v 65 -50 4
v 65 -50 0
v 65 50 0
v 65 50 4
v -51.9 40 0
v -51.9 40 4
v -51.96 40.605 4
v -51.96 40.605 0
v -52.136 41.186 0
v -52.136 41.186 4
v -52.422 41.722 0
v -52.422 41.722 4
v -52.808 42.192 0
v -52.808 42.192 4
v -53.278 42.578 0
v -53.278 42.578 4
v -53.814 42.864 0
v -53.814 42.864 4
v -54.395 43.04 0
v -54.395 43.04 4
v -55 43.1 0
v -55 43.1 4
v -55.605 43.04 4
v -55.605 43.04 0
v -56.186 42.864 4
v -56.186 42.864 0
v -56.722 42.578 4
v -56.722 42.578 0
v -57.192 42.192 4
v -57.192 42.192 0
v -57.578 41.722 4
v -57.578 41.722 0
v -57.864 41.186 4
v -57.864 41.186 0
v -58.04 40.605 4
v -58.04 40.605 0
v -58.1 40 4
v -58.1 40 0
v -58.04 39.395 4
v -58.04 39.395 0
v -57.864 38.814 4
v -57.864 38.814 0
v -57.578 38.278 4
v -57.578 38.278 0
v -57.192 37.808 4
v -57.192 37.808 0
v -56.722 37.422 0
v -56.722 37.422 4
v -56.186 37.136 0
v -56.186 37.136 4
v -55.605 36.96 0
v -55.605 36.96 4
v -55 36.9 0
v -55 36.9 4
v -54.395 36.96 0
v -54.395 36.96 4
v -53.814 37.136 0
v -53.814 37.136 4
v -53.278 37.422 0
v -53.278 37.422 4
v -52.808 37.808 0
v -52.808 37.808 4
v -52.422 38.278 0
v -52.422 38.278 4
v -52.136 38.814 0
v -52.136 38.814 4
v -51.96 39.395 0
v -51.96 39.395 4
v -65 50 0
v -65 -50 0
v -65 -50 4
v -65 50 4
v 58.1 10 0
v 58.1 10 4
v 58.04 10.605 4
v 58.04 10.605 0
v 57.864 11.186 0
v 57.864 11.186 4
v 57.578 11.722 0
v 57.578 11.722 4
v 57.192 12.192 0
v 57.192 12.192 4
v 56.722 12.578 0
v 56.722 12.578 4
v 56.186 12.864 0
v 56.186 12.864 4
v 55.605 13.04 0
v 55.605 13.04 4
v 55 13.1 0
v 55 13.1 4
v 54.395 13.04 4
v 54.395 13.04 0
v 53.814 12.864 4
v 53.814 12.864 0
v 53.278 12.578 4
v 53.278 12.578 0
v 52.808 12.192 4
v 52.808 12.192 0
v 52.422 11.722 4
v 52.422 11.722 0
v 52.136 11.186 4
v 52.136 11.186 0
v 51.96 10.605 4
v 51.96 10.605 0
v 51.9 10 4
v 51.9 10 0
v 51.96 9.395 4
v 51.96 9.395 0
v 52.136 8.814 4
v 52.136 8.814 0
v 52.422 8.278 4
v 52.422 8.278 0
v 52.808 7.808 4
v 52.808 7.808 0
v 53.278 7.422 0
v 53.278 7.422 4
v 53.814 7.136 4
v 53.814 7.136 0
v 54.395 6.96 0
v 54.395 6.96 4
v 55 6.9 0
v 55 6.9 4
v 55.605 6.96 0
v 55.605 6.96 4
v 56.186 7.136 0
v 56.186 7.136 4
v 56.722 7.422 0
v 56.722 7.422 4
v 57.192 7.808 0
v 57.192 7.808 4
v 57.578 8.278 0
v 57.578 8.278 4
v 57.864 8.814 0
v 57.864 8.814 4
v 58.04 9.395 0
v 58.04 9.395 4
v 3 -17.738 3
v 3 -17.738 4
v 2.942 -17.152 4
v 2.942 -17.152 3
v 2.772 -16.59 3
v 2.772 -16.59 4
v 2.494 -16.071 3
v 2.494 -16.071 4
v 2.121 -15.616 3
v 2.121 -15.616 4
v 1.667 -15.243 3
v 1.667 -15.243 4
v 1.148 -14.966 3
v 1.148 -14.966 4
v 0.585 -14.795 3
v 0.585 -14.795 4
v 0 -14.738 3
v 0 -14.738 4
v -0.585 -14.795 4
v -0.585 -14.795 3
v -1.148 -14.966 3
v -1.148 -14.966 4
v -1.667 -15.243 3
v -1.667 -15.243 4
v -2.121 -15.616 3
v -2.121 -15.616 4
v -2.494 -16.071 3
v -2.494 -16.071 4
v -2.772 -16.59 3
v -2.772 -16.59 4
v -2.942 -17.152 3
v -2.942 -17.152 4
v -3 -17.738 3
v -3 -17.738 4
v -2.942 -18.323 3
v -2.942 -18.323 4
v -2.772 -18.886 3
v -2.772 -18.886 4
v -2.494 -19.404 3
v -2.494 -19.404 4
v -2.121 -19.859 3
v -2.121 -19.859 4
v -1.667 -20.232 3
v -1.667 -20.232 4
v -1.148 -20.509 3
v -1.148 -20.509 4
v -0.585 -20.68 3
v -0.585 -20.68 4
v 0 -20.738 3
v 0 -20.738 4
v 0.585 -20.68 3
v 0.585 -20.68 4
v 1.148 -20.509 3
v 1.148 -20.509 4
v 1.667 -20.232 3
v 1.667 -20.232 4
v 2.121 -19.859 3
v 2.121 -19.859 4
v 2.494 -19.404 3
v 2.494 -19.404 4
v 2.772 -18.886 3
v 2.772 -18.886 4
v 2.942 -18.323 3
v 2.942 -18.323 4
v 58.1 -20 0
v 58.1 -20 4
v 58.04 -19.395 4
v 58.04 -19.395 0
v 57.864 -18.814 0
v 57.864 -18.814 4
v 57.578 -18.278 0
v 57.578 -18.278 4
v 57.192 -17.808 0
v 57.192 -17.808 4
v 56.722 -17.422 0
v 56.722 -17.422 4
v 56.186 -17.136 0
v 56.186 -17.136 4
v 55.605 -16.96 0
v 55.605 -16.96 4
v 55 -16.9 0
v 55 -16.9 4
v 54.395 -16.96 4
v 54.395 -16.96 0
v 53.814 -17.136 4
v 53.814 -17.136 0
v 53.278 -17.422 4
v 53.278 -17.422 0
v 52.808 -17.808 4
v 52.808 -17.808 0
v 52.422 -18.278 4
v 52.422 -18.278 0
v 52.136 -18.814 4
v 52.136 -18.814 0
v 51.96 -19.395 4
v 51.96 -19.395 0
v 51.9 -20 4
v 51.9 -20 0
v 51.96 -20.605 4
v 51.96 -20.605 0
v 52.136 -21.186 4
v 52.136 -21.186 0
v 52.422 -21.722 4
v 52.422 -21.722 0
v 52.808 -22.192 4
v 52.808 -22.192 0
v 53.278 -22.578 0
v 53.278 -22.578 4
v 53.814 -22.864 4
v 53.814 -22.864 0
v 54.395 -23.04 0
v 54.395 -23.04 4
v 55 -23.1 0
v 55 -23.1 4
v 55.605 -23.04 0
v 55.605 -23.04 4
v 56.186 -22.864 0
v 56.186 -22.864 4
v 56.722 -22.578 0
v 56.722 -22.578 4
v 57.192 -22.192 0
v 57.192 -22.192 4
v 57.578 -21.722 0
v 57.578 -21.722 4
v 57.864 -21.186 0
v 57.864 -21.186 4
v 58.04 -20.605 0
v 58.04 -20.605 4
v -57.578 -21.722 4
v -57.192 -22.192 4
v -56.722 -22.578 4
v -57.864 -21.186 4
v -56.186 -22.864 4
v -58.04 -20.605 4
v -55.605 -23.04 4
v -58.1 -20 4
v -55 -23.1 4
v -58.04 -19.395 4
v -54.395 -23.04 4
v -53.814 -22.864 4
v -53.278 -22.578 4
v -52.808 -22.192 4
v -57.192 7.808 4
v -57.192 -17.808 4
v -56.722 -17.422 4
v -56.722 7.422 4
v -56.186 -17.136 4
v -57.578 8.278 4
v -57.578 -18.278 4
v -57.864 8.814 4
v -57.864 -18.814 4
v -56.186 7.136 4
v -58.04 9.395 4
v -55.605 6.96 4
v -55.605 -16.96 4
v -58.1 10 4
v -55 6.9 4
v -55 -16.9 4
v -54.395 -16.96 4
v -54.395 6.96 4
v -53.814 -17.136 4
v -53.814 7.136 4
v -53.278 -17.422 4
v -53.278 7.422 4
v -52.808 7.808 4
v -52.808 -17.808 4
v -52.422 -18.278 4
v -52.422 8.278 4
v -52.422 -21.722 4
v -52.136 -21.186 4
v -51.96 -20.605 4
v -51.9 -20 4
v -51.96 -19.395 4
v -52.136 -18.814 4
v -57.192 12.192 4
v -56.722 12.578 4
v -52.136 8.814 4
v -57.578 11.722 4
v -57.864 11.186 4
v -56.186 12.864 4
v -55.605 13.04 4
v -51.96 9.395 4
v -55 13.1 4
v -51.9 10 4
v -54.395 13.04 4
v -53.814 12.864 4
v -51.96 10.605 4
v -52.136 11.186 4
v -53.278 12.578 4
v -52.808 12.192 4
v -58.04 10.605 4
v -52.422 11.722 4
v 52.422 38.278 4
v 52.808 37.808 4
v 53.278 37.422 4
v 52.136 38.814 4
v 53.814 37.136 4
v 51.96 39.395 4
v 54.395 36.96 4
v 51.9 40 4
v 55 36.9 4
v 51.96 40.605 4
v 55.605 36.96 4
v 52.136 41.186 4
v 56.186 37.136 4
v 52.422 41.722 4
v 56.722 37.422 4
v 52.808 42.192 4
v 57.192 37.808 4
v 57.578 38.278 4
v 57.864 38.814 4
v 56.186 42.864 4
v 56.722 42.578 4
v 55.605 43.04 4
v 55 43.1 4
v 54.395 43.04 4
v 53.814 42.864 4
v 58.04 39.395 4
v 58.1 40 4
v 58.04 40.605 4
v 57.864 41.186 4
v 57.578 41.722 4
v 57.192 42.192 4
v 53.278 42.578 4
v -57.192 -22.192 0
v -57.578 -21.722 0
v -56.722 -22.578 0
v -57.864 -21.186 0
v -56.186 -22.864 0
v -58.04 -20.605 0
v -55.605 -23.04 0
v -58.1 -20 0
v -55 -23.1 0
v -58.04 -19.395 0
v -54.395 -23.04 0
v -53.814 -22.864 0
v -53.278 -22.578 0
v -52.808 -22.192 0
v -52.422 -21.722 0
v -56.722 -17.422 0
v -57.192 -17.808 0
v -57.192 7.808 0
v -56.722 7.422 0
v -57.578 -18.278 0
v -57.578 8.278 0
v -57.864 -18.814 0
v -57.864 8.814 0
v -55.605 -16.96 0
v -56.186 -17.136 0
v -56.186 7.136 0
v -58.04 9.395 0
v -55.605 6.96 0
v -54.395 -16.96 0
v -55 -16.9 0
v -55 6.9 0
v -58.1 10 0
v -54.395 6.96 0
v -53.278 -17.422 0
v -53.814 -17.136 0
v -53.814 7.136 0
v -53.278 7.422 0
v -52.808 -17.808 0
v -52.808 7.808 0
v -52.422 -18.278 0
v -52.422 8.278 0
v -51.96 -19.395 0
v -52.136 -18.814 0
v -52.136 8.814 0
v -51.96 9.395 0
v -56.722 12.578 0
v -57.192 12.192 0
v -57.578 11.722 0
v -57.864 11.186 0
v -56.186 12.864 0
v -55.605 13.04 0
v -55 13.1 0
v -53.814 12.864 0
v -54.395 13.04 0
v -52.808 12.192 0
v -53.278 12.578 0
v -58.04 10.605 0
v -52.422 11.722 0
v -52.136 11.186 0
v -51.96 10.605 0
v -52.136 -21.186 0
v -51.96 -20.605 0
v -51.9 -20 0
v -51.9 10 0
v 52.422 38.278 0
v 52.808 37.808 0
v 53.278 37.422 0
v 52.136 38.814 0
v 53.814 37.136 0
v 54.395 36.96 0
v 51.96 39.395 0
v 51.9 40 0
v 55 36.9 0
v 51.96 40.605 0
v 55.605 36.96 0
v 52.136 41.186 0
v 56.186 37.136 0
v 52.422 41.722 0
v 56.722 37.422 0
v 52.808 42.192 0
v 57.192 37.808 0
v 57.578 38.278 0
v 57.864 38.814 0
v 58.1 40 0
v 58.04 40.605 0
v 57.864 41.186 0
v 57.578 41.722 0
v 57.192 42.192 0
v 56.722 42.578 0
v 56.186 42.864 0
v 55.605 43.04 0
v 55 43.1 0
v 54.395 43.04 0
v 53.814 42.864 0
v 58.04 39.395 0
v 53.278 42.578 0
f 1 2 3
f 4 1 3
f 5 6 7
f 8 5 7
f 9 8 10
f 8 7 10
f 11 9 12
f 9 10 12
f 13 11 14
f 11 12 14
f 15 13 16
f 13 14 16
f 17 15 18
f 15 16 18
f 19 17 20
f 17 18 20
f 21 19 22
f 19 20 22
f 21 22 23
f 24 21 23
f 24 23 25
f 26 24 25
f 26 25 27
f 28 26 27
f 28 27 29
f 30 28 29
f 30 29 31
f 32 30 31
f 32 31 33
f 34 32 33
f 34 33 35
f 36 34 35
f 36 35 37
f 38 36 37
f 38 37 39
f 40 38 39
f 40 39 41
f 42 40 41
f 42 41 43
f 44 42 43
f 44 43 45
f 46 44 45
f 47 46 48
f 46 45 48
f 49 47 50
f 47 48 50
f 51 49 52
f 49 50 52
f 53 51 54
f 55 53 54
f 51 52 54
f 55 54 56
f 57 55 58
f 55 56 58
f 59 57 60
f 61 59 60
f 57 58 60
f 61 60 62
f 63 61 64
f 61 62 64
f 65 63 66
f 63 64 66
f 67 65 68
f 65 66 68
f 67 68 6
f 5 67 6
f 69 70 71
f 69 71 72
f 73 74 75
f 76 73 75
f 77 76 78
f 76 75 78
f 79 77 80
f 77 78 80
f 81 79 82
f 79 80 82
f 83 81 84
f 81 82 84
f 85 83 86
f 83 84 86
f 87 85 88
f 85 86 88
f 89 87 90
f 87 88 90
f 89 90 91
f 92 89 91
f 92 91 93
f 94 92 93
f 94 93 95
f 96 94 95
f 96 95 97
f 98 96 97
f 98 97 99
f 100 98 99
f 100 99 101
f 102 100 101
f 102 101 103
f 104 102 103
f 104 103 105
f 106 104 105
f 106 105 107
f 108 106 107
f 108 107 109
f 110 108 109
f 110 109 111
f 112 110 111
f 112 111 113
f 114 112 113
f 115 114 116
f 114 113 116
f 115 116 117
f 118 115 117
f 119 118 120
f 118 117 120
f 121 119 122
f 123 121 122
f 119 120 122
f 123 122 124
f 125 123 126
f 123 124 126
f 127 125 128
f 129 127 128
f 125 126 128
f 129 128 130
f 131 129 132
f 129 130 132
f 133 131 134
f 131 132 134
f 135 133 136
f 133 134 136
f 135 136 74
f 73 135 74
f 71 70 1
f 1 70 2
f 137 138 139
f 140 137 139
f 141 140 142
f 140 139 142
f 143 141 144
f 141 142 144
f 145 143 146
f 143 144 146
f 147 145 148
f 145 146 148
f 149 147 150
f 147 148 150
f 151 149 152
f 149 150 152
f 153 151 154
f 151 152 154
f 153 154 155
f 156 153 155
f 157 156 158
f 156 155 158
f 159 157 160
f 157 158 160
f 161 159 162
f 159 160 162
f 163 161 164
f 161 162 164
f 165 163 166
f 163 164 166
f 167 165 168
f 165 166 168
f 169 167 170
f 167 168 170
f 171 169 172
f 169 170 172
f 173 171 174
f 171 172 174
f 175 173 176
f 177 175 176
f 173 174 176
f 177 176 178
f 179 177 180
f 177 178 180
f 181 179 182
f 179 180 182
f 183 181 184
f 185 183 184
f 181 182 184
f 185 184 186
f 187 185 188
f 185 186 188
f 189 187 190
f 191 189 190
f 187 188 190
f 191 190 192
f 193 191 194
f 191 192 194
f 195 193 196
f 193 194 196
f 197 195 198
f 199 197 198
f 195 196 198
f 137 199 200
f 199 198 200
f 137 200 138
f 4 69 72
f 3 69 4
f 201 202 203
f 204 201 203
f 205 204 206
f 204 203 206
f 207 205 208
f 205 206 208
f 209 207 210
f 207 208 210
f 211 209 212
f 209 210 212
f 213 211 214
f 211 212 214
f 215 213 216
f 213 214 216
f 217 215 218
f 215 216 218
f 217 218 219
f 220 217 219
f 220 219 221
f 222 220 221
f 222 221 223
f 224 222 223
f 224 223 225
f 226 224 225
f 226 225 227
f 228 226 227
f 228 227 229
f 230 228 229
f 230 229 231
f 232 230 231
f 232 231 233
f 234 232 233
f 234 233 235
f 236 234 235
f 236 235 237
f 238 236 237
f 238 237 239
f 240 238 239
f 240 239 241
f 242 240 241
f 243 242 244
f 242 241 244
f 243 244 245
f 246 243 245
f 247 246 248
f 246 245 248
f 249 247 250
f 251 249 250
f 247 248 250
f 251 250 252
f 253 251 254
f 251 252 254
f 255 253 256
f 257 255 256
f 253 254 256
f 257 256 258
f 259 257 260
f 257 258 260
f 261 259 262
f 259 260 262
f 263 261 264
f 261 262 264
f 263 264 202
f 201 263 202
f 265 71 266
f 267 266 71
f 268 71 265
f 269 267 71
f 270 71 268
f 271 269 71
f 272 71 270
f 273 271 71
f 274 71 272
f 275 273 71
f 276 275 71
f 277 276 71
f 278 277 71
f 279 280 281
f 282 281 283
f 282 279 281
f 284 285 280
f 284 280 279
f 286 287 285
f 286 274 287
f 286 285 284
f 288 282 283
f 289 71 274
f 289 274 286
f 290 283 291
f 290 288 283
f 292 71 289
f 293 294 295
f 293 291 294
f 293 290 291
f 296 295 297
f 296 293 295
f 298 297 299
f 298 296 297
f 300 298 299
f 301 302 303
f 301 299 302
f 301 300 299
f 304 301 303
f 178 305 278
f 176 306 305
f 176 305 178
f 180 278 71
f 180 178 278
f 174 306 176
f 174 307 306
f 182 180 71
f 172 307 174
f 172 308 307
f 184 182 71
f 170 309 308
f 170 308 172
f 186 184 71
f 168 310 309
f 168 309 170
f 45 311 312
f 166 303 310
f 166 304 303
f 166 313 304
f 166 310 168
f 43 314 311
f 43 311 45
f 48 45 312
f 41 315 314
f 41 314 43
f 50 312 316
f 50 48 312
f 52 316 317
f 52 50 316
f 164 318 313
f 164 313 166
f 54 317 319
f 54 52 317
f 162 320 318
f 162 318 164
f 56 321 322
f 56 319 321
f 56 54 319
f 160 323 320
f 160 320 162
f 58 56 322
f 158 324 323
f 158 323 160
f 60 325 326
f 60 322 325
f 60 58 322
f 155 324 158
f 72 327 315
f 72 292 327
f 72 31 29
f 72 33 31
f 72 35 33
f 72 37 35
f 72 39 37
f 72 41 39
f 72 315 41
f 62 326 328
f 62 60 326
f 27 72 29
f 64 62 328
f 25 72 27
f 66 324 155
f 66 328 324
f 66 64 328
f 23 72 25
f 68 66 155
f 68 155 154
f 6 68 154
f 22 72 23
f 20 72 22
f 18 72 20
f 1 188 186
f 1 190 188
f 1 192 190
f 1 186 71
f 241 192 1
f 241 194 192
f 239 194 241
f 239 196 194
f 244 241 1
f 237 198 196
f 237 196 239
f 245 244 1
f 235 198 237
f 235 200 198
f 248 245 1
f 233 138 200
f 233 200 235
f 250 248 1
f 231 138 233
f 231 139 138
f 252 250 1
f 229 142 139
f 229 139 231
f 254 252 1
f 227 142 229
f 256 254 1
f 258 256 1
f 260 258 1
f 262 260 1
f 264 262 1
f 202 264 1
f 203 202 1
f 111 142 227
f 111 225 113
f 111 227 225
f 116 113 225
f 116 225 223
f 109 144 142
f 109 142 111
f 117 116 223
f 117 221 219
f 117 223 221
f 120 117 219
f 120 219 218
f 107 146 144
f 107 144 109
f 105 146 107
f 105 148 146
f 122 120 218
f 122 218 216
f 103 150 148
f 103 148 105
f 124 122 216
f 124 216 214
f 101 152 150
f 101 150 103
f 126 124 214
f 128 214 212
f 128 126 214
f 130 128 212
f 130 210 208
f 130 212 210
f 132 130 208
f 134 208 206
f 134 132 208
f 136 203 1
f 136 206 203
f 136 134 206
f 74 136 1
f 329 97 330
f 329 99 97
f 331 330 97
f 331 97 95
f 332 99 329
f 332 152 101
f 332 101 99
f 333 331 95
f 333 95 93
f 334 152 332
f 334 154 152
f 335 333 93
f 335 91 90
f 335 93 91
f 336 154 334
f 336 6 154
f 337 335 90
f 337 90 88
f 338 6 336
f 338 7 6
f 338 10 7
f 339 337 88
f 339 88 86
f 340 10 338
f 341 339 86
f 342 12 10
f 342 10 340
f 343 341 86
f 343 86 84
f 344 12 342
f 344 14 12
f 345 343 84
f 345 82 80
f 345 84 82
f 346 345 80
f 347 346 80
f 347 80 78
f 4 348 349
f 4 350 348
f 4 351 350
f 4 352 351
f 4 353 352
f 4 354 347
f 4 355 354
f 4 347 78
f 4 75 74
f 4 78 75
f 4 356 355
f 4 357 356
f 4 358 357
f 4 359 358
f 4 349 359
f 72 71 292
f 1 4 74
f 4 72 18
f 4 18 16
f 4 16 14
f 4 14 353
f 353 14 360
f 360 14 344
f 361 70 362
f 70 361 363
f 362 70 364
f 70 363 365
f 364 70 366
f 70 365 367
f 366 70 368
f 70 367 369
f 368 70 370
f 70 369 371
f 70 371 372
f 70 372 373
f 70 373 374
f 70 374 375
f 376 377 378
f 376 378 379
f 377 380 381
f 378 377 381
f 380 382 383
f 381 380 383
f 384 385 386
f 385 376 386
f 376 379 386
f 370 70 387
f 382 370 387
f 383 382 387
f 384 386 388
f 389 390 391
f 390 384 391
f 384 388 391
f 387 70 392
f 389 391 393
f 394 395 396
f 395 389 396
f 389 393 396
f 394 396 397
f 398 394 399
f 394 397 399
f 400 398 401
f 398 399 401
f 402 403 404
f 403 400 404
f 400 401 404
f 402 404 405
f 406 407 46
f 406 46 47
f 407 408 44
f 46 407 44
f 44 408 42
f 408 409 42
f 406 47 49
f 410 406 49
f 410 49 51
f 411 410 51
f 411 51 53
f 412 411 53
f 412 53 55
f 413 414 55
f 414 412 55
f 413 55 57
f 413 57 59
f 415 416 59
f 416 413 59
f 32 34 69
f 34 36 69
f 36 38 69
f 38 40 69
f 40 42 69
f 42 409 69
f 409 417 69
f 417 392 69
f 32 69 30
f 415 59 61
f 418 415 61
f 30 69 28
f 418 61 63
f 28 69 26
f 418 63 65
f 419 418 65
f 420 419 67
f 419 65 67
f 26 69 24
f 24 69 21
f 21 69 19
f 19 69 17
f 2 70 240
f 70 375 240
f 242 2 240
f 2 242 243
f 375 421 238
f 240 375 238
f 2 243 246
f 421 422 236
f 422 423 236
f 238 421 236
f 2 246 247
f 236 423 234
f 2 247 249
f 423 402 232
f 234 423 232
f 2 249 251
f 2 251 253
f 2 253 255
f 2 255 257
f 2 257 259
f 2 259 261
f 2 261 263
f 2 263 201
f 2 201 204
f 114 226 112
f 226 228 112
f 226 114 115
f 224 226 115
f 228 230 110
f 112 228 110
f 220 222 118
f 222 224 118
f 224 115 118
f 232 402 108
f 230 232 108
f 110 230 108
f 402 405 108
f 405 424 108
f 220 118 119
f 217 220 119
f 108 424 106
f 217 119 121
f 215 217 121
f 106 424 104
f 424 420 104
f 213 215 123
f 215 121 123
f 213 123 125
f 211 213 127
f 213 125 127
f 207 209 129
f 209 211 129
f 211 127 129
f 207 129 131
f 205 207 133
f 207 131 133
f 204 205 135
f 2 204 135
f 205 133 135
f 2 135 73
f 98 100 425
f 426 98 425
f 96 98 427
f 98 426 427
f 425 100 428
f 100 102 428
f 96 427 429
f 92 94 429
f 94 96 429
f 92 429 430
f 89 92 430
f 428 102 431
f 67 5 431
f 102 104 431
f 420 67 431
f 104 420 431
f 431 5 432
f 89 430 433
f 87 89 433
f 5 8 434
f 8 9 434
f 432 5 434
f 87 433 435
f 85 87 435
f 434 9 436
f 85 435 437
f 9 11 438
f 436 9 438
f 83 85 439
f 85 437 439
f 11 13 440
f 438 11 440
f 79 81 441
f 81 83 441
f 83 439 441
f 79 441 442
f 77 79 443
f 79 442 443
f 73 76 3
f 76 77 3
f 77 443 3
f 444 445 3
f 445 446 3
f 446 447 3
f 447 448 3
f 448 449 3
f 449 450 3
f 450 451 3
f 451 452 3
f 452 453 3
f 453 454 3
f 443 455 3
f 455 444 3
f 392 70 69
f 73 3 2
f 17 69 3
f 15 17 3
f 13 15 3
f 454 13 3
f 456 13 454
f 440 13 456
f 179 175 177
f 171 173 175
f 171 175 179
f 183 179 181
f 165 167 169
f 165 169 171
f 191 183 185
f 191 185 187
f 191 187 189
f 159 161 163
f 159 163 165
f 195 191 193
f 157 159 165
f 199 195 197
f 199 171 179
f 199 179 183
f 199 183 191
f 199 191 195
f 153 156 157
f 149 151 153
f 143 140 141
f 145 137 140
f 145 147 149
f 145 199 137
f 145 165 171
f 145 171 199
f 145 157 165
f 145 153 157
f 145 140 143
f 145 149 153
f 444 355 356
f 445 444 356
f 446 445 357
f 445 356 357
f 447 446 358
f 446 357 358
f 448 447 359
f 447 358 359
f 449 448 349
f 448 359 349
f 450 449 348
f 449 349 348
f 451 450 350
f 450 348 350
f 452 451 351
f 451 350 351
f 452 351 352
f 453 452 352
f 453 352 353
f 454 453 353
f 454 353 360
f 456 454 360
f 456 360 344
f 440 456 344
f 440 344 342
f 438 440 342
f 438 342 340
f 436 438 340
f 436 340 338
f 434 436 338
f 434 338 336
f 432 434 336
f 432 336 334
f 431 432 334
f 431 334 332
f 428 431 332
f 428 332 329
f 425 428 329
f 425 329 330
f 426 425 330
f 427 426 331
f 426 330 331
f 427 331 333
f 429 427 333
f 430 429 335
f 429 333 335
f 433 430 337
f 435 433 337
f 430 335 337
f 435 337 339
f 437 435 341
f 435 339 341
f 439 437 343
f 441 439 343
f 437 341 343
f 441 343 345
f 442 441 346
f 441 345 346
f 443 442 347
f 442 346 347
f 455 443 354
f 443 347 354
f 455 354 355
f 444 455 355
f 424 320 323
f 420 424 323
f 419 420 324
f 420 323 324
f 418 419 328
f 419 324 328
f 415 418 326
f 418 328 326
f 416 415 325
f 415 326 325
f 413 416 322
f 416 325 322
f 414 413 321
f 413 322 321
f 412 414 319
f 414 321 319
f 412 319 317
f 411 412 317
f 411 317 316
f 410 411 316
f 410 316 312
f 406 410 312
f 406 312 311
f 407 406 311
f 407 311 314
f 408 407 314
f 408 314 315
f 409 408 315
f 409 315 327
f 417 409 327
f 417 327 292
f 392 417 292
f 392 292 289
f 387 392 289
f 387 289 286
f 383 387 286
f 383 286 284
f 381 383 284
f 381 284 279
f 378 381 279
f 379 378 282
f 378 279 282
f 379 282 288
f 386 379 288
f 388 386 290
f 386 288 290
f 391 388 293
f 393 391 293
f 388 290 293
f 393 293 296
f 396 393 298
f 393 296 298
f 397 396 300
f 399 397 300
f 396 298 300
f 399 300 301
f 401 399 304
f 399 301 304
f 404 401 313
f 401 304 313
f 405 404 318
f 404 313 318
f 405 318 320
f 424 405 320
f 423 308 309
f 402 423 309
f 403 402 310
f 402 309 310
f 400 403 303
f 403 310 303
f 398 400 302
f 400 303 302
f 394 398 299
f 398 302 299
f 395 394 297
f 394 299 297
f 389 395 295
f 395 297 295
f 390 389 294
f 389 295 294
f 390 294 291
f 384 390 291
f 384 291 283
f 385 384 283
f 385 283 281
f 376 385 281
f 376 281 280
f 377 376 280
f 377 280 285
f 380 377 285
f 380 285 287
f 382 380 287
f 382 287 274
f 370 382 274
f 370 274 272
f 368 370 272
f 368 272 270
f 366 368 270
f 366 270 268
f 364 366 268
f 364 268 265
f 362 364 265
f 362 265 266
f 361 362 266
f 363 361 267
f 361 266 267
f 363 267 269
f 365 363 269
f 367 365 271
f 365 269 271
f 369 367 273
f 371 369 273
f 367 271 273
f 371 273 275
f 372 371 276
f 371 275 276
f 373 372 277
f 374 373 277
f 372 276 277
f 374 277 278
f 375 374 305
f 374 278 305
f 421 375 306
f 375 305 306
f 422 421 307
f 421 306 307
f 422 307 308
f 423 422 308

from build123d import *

# Parameters (mm, degrees)
SKETCH_2_W            = 210
SKETCH_2_H            = 100
EXTRUDE_1_DEPTH       = 4
SKETCH_7_R            = 3
CUT_EXTRUDE_2_DEPTH   = 1
SKETCH_8_R            = 3.1
CUT_EXTRUDE_3_DEPTH   = 60
SKETCH_11_OUTSIDE_W   = 258.526
SKETCH_11_OUTSIDE_H   = 148.526
SKETCH_11_OUTSIDE_W_2 = 130
SKETCH_11_OUTSIDE_H_2 = 100
SKETCH_11_OUTSIDE_R   = 3.1
CUT_EXTRUDE_5_DEPTH   = 100


with BuildPart() as part:
    # 草图2 → 凸台-拉伸1 (new body)
    with BuildSketch(Plane.XY):
        Rectangle(SKETCH_2_W, SKETCH_2_H)
    extrude(amount=EXTRUDE_1_DEPTH)

    # 草图7 → 切除-拉伸2 (cut)
    with BuildSketch(Plane.XY.offset(4)):
        with Locations((0, -17.737584897)):
            Circle(SKETCH_7_R)
    extrude(amount=-CUT_EXTRUDE_2_DEPTH, mode=Mode.SUBTRACT)

    # 草图8 → 切除-拉伸3 (cut)
    with BuildSketch(Plane.XY.offset(4)):
        with Locations((-55, 10)):
            Circle(SKETCH_8_R)
        with Locations((-55, 40)):
            Circle(SKETCH_8_R)
        with Locations((-55, -20)):
            Circle(SKETCH_8_R)
        with Locations((55, 40)):
            Circle(SKETCH_8_R)
        with Locations((55, 10)):
            Circle(SKETCH_8_R)
        with Locations((55, -20)):
            Circle(SKETCH_8_R)
    extrude(amount=-CUT_EXTRUDE_3_DEPTH, mode=Mode.SUBTRACT)

    # 草图11 outside → 切除-拉伸5 (cut)
    # profile 1 of 2: a face of its own
    with BuildSketch(Plane(origin=(0, 0, 0), x_dir=(-1, 0, 0), z_dir=(0, 0, -1))):
        Rectangle(SKETCH_11_OUTSIDE_W, SKETCH_11_OUTSIDE_H)
        Rectangle(SKETCH_11_OUTSIDE_W_2, SKETCH_11_OUTSIDE_H_2, mode=Mode.SUBTRACT)
    # profile 2 of 2: a face of its own
    with BuildSketch(Plane(origin=(0, 0, 0), x_dir=(-1, 0, 0), z_dir=(0, 0, -1))):
        with Locations(Location((55, 40, 0), (0, 0, 180))):
            Circle(SKETCH_11_OUTSIDE_R)
    extrude(amount=-CUT_EXTRUDE_5_DEPTH, mode=Mode.SUBTRACT)


solid = part.part
